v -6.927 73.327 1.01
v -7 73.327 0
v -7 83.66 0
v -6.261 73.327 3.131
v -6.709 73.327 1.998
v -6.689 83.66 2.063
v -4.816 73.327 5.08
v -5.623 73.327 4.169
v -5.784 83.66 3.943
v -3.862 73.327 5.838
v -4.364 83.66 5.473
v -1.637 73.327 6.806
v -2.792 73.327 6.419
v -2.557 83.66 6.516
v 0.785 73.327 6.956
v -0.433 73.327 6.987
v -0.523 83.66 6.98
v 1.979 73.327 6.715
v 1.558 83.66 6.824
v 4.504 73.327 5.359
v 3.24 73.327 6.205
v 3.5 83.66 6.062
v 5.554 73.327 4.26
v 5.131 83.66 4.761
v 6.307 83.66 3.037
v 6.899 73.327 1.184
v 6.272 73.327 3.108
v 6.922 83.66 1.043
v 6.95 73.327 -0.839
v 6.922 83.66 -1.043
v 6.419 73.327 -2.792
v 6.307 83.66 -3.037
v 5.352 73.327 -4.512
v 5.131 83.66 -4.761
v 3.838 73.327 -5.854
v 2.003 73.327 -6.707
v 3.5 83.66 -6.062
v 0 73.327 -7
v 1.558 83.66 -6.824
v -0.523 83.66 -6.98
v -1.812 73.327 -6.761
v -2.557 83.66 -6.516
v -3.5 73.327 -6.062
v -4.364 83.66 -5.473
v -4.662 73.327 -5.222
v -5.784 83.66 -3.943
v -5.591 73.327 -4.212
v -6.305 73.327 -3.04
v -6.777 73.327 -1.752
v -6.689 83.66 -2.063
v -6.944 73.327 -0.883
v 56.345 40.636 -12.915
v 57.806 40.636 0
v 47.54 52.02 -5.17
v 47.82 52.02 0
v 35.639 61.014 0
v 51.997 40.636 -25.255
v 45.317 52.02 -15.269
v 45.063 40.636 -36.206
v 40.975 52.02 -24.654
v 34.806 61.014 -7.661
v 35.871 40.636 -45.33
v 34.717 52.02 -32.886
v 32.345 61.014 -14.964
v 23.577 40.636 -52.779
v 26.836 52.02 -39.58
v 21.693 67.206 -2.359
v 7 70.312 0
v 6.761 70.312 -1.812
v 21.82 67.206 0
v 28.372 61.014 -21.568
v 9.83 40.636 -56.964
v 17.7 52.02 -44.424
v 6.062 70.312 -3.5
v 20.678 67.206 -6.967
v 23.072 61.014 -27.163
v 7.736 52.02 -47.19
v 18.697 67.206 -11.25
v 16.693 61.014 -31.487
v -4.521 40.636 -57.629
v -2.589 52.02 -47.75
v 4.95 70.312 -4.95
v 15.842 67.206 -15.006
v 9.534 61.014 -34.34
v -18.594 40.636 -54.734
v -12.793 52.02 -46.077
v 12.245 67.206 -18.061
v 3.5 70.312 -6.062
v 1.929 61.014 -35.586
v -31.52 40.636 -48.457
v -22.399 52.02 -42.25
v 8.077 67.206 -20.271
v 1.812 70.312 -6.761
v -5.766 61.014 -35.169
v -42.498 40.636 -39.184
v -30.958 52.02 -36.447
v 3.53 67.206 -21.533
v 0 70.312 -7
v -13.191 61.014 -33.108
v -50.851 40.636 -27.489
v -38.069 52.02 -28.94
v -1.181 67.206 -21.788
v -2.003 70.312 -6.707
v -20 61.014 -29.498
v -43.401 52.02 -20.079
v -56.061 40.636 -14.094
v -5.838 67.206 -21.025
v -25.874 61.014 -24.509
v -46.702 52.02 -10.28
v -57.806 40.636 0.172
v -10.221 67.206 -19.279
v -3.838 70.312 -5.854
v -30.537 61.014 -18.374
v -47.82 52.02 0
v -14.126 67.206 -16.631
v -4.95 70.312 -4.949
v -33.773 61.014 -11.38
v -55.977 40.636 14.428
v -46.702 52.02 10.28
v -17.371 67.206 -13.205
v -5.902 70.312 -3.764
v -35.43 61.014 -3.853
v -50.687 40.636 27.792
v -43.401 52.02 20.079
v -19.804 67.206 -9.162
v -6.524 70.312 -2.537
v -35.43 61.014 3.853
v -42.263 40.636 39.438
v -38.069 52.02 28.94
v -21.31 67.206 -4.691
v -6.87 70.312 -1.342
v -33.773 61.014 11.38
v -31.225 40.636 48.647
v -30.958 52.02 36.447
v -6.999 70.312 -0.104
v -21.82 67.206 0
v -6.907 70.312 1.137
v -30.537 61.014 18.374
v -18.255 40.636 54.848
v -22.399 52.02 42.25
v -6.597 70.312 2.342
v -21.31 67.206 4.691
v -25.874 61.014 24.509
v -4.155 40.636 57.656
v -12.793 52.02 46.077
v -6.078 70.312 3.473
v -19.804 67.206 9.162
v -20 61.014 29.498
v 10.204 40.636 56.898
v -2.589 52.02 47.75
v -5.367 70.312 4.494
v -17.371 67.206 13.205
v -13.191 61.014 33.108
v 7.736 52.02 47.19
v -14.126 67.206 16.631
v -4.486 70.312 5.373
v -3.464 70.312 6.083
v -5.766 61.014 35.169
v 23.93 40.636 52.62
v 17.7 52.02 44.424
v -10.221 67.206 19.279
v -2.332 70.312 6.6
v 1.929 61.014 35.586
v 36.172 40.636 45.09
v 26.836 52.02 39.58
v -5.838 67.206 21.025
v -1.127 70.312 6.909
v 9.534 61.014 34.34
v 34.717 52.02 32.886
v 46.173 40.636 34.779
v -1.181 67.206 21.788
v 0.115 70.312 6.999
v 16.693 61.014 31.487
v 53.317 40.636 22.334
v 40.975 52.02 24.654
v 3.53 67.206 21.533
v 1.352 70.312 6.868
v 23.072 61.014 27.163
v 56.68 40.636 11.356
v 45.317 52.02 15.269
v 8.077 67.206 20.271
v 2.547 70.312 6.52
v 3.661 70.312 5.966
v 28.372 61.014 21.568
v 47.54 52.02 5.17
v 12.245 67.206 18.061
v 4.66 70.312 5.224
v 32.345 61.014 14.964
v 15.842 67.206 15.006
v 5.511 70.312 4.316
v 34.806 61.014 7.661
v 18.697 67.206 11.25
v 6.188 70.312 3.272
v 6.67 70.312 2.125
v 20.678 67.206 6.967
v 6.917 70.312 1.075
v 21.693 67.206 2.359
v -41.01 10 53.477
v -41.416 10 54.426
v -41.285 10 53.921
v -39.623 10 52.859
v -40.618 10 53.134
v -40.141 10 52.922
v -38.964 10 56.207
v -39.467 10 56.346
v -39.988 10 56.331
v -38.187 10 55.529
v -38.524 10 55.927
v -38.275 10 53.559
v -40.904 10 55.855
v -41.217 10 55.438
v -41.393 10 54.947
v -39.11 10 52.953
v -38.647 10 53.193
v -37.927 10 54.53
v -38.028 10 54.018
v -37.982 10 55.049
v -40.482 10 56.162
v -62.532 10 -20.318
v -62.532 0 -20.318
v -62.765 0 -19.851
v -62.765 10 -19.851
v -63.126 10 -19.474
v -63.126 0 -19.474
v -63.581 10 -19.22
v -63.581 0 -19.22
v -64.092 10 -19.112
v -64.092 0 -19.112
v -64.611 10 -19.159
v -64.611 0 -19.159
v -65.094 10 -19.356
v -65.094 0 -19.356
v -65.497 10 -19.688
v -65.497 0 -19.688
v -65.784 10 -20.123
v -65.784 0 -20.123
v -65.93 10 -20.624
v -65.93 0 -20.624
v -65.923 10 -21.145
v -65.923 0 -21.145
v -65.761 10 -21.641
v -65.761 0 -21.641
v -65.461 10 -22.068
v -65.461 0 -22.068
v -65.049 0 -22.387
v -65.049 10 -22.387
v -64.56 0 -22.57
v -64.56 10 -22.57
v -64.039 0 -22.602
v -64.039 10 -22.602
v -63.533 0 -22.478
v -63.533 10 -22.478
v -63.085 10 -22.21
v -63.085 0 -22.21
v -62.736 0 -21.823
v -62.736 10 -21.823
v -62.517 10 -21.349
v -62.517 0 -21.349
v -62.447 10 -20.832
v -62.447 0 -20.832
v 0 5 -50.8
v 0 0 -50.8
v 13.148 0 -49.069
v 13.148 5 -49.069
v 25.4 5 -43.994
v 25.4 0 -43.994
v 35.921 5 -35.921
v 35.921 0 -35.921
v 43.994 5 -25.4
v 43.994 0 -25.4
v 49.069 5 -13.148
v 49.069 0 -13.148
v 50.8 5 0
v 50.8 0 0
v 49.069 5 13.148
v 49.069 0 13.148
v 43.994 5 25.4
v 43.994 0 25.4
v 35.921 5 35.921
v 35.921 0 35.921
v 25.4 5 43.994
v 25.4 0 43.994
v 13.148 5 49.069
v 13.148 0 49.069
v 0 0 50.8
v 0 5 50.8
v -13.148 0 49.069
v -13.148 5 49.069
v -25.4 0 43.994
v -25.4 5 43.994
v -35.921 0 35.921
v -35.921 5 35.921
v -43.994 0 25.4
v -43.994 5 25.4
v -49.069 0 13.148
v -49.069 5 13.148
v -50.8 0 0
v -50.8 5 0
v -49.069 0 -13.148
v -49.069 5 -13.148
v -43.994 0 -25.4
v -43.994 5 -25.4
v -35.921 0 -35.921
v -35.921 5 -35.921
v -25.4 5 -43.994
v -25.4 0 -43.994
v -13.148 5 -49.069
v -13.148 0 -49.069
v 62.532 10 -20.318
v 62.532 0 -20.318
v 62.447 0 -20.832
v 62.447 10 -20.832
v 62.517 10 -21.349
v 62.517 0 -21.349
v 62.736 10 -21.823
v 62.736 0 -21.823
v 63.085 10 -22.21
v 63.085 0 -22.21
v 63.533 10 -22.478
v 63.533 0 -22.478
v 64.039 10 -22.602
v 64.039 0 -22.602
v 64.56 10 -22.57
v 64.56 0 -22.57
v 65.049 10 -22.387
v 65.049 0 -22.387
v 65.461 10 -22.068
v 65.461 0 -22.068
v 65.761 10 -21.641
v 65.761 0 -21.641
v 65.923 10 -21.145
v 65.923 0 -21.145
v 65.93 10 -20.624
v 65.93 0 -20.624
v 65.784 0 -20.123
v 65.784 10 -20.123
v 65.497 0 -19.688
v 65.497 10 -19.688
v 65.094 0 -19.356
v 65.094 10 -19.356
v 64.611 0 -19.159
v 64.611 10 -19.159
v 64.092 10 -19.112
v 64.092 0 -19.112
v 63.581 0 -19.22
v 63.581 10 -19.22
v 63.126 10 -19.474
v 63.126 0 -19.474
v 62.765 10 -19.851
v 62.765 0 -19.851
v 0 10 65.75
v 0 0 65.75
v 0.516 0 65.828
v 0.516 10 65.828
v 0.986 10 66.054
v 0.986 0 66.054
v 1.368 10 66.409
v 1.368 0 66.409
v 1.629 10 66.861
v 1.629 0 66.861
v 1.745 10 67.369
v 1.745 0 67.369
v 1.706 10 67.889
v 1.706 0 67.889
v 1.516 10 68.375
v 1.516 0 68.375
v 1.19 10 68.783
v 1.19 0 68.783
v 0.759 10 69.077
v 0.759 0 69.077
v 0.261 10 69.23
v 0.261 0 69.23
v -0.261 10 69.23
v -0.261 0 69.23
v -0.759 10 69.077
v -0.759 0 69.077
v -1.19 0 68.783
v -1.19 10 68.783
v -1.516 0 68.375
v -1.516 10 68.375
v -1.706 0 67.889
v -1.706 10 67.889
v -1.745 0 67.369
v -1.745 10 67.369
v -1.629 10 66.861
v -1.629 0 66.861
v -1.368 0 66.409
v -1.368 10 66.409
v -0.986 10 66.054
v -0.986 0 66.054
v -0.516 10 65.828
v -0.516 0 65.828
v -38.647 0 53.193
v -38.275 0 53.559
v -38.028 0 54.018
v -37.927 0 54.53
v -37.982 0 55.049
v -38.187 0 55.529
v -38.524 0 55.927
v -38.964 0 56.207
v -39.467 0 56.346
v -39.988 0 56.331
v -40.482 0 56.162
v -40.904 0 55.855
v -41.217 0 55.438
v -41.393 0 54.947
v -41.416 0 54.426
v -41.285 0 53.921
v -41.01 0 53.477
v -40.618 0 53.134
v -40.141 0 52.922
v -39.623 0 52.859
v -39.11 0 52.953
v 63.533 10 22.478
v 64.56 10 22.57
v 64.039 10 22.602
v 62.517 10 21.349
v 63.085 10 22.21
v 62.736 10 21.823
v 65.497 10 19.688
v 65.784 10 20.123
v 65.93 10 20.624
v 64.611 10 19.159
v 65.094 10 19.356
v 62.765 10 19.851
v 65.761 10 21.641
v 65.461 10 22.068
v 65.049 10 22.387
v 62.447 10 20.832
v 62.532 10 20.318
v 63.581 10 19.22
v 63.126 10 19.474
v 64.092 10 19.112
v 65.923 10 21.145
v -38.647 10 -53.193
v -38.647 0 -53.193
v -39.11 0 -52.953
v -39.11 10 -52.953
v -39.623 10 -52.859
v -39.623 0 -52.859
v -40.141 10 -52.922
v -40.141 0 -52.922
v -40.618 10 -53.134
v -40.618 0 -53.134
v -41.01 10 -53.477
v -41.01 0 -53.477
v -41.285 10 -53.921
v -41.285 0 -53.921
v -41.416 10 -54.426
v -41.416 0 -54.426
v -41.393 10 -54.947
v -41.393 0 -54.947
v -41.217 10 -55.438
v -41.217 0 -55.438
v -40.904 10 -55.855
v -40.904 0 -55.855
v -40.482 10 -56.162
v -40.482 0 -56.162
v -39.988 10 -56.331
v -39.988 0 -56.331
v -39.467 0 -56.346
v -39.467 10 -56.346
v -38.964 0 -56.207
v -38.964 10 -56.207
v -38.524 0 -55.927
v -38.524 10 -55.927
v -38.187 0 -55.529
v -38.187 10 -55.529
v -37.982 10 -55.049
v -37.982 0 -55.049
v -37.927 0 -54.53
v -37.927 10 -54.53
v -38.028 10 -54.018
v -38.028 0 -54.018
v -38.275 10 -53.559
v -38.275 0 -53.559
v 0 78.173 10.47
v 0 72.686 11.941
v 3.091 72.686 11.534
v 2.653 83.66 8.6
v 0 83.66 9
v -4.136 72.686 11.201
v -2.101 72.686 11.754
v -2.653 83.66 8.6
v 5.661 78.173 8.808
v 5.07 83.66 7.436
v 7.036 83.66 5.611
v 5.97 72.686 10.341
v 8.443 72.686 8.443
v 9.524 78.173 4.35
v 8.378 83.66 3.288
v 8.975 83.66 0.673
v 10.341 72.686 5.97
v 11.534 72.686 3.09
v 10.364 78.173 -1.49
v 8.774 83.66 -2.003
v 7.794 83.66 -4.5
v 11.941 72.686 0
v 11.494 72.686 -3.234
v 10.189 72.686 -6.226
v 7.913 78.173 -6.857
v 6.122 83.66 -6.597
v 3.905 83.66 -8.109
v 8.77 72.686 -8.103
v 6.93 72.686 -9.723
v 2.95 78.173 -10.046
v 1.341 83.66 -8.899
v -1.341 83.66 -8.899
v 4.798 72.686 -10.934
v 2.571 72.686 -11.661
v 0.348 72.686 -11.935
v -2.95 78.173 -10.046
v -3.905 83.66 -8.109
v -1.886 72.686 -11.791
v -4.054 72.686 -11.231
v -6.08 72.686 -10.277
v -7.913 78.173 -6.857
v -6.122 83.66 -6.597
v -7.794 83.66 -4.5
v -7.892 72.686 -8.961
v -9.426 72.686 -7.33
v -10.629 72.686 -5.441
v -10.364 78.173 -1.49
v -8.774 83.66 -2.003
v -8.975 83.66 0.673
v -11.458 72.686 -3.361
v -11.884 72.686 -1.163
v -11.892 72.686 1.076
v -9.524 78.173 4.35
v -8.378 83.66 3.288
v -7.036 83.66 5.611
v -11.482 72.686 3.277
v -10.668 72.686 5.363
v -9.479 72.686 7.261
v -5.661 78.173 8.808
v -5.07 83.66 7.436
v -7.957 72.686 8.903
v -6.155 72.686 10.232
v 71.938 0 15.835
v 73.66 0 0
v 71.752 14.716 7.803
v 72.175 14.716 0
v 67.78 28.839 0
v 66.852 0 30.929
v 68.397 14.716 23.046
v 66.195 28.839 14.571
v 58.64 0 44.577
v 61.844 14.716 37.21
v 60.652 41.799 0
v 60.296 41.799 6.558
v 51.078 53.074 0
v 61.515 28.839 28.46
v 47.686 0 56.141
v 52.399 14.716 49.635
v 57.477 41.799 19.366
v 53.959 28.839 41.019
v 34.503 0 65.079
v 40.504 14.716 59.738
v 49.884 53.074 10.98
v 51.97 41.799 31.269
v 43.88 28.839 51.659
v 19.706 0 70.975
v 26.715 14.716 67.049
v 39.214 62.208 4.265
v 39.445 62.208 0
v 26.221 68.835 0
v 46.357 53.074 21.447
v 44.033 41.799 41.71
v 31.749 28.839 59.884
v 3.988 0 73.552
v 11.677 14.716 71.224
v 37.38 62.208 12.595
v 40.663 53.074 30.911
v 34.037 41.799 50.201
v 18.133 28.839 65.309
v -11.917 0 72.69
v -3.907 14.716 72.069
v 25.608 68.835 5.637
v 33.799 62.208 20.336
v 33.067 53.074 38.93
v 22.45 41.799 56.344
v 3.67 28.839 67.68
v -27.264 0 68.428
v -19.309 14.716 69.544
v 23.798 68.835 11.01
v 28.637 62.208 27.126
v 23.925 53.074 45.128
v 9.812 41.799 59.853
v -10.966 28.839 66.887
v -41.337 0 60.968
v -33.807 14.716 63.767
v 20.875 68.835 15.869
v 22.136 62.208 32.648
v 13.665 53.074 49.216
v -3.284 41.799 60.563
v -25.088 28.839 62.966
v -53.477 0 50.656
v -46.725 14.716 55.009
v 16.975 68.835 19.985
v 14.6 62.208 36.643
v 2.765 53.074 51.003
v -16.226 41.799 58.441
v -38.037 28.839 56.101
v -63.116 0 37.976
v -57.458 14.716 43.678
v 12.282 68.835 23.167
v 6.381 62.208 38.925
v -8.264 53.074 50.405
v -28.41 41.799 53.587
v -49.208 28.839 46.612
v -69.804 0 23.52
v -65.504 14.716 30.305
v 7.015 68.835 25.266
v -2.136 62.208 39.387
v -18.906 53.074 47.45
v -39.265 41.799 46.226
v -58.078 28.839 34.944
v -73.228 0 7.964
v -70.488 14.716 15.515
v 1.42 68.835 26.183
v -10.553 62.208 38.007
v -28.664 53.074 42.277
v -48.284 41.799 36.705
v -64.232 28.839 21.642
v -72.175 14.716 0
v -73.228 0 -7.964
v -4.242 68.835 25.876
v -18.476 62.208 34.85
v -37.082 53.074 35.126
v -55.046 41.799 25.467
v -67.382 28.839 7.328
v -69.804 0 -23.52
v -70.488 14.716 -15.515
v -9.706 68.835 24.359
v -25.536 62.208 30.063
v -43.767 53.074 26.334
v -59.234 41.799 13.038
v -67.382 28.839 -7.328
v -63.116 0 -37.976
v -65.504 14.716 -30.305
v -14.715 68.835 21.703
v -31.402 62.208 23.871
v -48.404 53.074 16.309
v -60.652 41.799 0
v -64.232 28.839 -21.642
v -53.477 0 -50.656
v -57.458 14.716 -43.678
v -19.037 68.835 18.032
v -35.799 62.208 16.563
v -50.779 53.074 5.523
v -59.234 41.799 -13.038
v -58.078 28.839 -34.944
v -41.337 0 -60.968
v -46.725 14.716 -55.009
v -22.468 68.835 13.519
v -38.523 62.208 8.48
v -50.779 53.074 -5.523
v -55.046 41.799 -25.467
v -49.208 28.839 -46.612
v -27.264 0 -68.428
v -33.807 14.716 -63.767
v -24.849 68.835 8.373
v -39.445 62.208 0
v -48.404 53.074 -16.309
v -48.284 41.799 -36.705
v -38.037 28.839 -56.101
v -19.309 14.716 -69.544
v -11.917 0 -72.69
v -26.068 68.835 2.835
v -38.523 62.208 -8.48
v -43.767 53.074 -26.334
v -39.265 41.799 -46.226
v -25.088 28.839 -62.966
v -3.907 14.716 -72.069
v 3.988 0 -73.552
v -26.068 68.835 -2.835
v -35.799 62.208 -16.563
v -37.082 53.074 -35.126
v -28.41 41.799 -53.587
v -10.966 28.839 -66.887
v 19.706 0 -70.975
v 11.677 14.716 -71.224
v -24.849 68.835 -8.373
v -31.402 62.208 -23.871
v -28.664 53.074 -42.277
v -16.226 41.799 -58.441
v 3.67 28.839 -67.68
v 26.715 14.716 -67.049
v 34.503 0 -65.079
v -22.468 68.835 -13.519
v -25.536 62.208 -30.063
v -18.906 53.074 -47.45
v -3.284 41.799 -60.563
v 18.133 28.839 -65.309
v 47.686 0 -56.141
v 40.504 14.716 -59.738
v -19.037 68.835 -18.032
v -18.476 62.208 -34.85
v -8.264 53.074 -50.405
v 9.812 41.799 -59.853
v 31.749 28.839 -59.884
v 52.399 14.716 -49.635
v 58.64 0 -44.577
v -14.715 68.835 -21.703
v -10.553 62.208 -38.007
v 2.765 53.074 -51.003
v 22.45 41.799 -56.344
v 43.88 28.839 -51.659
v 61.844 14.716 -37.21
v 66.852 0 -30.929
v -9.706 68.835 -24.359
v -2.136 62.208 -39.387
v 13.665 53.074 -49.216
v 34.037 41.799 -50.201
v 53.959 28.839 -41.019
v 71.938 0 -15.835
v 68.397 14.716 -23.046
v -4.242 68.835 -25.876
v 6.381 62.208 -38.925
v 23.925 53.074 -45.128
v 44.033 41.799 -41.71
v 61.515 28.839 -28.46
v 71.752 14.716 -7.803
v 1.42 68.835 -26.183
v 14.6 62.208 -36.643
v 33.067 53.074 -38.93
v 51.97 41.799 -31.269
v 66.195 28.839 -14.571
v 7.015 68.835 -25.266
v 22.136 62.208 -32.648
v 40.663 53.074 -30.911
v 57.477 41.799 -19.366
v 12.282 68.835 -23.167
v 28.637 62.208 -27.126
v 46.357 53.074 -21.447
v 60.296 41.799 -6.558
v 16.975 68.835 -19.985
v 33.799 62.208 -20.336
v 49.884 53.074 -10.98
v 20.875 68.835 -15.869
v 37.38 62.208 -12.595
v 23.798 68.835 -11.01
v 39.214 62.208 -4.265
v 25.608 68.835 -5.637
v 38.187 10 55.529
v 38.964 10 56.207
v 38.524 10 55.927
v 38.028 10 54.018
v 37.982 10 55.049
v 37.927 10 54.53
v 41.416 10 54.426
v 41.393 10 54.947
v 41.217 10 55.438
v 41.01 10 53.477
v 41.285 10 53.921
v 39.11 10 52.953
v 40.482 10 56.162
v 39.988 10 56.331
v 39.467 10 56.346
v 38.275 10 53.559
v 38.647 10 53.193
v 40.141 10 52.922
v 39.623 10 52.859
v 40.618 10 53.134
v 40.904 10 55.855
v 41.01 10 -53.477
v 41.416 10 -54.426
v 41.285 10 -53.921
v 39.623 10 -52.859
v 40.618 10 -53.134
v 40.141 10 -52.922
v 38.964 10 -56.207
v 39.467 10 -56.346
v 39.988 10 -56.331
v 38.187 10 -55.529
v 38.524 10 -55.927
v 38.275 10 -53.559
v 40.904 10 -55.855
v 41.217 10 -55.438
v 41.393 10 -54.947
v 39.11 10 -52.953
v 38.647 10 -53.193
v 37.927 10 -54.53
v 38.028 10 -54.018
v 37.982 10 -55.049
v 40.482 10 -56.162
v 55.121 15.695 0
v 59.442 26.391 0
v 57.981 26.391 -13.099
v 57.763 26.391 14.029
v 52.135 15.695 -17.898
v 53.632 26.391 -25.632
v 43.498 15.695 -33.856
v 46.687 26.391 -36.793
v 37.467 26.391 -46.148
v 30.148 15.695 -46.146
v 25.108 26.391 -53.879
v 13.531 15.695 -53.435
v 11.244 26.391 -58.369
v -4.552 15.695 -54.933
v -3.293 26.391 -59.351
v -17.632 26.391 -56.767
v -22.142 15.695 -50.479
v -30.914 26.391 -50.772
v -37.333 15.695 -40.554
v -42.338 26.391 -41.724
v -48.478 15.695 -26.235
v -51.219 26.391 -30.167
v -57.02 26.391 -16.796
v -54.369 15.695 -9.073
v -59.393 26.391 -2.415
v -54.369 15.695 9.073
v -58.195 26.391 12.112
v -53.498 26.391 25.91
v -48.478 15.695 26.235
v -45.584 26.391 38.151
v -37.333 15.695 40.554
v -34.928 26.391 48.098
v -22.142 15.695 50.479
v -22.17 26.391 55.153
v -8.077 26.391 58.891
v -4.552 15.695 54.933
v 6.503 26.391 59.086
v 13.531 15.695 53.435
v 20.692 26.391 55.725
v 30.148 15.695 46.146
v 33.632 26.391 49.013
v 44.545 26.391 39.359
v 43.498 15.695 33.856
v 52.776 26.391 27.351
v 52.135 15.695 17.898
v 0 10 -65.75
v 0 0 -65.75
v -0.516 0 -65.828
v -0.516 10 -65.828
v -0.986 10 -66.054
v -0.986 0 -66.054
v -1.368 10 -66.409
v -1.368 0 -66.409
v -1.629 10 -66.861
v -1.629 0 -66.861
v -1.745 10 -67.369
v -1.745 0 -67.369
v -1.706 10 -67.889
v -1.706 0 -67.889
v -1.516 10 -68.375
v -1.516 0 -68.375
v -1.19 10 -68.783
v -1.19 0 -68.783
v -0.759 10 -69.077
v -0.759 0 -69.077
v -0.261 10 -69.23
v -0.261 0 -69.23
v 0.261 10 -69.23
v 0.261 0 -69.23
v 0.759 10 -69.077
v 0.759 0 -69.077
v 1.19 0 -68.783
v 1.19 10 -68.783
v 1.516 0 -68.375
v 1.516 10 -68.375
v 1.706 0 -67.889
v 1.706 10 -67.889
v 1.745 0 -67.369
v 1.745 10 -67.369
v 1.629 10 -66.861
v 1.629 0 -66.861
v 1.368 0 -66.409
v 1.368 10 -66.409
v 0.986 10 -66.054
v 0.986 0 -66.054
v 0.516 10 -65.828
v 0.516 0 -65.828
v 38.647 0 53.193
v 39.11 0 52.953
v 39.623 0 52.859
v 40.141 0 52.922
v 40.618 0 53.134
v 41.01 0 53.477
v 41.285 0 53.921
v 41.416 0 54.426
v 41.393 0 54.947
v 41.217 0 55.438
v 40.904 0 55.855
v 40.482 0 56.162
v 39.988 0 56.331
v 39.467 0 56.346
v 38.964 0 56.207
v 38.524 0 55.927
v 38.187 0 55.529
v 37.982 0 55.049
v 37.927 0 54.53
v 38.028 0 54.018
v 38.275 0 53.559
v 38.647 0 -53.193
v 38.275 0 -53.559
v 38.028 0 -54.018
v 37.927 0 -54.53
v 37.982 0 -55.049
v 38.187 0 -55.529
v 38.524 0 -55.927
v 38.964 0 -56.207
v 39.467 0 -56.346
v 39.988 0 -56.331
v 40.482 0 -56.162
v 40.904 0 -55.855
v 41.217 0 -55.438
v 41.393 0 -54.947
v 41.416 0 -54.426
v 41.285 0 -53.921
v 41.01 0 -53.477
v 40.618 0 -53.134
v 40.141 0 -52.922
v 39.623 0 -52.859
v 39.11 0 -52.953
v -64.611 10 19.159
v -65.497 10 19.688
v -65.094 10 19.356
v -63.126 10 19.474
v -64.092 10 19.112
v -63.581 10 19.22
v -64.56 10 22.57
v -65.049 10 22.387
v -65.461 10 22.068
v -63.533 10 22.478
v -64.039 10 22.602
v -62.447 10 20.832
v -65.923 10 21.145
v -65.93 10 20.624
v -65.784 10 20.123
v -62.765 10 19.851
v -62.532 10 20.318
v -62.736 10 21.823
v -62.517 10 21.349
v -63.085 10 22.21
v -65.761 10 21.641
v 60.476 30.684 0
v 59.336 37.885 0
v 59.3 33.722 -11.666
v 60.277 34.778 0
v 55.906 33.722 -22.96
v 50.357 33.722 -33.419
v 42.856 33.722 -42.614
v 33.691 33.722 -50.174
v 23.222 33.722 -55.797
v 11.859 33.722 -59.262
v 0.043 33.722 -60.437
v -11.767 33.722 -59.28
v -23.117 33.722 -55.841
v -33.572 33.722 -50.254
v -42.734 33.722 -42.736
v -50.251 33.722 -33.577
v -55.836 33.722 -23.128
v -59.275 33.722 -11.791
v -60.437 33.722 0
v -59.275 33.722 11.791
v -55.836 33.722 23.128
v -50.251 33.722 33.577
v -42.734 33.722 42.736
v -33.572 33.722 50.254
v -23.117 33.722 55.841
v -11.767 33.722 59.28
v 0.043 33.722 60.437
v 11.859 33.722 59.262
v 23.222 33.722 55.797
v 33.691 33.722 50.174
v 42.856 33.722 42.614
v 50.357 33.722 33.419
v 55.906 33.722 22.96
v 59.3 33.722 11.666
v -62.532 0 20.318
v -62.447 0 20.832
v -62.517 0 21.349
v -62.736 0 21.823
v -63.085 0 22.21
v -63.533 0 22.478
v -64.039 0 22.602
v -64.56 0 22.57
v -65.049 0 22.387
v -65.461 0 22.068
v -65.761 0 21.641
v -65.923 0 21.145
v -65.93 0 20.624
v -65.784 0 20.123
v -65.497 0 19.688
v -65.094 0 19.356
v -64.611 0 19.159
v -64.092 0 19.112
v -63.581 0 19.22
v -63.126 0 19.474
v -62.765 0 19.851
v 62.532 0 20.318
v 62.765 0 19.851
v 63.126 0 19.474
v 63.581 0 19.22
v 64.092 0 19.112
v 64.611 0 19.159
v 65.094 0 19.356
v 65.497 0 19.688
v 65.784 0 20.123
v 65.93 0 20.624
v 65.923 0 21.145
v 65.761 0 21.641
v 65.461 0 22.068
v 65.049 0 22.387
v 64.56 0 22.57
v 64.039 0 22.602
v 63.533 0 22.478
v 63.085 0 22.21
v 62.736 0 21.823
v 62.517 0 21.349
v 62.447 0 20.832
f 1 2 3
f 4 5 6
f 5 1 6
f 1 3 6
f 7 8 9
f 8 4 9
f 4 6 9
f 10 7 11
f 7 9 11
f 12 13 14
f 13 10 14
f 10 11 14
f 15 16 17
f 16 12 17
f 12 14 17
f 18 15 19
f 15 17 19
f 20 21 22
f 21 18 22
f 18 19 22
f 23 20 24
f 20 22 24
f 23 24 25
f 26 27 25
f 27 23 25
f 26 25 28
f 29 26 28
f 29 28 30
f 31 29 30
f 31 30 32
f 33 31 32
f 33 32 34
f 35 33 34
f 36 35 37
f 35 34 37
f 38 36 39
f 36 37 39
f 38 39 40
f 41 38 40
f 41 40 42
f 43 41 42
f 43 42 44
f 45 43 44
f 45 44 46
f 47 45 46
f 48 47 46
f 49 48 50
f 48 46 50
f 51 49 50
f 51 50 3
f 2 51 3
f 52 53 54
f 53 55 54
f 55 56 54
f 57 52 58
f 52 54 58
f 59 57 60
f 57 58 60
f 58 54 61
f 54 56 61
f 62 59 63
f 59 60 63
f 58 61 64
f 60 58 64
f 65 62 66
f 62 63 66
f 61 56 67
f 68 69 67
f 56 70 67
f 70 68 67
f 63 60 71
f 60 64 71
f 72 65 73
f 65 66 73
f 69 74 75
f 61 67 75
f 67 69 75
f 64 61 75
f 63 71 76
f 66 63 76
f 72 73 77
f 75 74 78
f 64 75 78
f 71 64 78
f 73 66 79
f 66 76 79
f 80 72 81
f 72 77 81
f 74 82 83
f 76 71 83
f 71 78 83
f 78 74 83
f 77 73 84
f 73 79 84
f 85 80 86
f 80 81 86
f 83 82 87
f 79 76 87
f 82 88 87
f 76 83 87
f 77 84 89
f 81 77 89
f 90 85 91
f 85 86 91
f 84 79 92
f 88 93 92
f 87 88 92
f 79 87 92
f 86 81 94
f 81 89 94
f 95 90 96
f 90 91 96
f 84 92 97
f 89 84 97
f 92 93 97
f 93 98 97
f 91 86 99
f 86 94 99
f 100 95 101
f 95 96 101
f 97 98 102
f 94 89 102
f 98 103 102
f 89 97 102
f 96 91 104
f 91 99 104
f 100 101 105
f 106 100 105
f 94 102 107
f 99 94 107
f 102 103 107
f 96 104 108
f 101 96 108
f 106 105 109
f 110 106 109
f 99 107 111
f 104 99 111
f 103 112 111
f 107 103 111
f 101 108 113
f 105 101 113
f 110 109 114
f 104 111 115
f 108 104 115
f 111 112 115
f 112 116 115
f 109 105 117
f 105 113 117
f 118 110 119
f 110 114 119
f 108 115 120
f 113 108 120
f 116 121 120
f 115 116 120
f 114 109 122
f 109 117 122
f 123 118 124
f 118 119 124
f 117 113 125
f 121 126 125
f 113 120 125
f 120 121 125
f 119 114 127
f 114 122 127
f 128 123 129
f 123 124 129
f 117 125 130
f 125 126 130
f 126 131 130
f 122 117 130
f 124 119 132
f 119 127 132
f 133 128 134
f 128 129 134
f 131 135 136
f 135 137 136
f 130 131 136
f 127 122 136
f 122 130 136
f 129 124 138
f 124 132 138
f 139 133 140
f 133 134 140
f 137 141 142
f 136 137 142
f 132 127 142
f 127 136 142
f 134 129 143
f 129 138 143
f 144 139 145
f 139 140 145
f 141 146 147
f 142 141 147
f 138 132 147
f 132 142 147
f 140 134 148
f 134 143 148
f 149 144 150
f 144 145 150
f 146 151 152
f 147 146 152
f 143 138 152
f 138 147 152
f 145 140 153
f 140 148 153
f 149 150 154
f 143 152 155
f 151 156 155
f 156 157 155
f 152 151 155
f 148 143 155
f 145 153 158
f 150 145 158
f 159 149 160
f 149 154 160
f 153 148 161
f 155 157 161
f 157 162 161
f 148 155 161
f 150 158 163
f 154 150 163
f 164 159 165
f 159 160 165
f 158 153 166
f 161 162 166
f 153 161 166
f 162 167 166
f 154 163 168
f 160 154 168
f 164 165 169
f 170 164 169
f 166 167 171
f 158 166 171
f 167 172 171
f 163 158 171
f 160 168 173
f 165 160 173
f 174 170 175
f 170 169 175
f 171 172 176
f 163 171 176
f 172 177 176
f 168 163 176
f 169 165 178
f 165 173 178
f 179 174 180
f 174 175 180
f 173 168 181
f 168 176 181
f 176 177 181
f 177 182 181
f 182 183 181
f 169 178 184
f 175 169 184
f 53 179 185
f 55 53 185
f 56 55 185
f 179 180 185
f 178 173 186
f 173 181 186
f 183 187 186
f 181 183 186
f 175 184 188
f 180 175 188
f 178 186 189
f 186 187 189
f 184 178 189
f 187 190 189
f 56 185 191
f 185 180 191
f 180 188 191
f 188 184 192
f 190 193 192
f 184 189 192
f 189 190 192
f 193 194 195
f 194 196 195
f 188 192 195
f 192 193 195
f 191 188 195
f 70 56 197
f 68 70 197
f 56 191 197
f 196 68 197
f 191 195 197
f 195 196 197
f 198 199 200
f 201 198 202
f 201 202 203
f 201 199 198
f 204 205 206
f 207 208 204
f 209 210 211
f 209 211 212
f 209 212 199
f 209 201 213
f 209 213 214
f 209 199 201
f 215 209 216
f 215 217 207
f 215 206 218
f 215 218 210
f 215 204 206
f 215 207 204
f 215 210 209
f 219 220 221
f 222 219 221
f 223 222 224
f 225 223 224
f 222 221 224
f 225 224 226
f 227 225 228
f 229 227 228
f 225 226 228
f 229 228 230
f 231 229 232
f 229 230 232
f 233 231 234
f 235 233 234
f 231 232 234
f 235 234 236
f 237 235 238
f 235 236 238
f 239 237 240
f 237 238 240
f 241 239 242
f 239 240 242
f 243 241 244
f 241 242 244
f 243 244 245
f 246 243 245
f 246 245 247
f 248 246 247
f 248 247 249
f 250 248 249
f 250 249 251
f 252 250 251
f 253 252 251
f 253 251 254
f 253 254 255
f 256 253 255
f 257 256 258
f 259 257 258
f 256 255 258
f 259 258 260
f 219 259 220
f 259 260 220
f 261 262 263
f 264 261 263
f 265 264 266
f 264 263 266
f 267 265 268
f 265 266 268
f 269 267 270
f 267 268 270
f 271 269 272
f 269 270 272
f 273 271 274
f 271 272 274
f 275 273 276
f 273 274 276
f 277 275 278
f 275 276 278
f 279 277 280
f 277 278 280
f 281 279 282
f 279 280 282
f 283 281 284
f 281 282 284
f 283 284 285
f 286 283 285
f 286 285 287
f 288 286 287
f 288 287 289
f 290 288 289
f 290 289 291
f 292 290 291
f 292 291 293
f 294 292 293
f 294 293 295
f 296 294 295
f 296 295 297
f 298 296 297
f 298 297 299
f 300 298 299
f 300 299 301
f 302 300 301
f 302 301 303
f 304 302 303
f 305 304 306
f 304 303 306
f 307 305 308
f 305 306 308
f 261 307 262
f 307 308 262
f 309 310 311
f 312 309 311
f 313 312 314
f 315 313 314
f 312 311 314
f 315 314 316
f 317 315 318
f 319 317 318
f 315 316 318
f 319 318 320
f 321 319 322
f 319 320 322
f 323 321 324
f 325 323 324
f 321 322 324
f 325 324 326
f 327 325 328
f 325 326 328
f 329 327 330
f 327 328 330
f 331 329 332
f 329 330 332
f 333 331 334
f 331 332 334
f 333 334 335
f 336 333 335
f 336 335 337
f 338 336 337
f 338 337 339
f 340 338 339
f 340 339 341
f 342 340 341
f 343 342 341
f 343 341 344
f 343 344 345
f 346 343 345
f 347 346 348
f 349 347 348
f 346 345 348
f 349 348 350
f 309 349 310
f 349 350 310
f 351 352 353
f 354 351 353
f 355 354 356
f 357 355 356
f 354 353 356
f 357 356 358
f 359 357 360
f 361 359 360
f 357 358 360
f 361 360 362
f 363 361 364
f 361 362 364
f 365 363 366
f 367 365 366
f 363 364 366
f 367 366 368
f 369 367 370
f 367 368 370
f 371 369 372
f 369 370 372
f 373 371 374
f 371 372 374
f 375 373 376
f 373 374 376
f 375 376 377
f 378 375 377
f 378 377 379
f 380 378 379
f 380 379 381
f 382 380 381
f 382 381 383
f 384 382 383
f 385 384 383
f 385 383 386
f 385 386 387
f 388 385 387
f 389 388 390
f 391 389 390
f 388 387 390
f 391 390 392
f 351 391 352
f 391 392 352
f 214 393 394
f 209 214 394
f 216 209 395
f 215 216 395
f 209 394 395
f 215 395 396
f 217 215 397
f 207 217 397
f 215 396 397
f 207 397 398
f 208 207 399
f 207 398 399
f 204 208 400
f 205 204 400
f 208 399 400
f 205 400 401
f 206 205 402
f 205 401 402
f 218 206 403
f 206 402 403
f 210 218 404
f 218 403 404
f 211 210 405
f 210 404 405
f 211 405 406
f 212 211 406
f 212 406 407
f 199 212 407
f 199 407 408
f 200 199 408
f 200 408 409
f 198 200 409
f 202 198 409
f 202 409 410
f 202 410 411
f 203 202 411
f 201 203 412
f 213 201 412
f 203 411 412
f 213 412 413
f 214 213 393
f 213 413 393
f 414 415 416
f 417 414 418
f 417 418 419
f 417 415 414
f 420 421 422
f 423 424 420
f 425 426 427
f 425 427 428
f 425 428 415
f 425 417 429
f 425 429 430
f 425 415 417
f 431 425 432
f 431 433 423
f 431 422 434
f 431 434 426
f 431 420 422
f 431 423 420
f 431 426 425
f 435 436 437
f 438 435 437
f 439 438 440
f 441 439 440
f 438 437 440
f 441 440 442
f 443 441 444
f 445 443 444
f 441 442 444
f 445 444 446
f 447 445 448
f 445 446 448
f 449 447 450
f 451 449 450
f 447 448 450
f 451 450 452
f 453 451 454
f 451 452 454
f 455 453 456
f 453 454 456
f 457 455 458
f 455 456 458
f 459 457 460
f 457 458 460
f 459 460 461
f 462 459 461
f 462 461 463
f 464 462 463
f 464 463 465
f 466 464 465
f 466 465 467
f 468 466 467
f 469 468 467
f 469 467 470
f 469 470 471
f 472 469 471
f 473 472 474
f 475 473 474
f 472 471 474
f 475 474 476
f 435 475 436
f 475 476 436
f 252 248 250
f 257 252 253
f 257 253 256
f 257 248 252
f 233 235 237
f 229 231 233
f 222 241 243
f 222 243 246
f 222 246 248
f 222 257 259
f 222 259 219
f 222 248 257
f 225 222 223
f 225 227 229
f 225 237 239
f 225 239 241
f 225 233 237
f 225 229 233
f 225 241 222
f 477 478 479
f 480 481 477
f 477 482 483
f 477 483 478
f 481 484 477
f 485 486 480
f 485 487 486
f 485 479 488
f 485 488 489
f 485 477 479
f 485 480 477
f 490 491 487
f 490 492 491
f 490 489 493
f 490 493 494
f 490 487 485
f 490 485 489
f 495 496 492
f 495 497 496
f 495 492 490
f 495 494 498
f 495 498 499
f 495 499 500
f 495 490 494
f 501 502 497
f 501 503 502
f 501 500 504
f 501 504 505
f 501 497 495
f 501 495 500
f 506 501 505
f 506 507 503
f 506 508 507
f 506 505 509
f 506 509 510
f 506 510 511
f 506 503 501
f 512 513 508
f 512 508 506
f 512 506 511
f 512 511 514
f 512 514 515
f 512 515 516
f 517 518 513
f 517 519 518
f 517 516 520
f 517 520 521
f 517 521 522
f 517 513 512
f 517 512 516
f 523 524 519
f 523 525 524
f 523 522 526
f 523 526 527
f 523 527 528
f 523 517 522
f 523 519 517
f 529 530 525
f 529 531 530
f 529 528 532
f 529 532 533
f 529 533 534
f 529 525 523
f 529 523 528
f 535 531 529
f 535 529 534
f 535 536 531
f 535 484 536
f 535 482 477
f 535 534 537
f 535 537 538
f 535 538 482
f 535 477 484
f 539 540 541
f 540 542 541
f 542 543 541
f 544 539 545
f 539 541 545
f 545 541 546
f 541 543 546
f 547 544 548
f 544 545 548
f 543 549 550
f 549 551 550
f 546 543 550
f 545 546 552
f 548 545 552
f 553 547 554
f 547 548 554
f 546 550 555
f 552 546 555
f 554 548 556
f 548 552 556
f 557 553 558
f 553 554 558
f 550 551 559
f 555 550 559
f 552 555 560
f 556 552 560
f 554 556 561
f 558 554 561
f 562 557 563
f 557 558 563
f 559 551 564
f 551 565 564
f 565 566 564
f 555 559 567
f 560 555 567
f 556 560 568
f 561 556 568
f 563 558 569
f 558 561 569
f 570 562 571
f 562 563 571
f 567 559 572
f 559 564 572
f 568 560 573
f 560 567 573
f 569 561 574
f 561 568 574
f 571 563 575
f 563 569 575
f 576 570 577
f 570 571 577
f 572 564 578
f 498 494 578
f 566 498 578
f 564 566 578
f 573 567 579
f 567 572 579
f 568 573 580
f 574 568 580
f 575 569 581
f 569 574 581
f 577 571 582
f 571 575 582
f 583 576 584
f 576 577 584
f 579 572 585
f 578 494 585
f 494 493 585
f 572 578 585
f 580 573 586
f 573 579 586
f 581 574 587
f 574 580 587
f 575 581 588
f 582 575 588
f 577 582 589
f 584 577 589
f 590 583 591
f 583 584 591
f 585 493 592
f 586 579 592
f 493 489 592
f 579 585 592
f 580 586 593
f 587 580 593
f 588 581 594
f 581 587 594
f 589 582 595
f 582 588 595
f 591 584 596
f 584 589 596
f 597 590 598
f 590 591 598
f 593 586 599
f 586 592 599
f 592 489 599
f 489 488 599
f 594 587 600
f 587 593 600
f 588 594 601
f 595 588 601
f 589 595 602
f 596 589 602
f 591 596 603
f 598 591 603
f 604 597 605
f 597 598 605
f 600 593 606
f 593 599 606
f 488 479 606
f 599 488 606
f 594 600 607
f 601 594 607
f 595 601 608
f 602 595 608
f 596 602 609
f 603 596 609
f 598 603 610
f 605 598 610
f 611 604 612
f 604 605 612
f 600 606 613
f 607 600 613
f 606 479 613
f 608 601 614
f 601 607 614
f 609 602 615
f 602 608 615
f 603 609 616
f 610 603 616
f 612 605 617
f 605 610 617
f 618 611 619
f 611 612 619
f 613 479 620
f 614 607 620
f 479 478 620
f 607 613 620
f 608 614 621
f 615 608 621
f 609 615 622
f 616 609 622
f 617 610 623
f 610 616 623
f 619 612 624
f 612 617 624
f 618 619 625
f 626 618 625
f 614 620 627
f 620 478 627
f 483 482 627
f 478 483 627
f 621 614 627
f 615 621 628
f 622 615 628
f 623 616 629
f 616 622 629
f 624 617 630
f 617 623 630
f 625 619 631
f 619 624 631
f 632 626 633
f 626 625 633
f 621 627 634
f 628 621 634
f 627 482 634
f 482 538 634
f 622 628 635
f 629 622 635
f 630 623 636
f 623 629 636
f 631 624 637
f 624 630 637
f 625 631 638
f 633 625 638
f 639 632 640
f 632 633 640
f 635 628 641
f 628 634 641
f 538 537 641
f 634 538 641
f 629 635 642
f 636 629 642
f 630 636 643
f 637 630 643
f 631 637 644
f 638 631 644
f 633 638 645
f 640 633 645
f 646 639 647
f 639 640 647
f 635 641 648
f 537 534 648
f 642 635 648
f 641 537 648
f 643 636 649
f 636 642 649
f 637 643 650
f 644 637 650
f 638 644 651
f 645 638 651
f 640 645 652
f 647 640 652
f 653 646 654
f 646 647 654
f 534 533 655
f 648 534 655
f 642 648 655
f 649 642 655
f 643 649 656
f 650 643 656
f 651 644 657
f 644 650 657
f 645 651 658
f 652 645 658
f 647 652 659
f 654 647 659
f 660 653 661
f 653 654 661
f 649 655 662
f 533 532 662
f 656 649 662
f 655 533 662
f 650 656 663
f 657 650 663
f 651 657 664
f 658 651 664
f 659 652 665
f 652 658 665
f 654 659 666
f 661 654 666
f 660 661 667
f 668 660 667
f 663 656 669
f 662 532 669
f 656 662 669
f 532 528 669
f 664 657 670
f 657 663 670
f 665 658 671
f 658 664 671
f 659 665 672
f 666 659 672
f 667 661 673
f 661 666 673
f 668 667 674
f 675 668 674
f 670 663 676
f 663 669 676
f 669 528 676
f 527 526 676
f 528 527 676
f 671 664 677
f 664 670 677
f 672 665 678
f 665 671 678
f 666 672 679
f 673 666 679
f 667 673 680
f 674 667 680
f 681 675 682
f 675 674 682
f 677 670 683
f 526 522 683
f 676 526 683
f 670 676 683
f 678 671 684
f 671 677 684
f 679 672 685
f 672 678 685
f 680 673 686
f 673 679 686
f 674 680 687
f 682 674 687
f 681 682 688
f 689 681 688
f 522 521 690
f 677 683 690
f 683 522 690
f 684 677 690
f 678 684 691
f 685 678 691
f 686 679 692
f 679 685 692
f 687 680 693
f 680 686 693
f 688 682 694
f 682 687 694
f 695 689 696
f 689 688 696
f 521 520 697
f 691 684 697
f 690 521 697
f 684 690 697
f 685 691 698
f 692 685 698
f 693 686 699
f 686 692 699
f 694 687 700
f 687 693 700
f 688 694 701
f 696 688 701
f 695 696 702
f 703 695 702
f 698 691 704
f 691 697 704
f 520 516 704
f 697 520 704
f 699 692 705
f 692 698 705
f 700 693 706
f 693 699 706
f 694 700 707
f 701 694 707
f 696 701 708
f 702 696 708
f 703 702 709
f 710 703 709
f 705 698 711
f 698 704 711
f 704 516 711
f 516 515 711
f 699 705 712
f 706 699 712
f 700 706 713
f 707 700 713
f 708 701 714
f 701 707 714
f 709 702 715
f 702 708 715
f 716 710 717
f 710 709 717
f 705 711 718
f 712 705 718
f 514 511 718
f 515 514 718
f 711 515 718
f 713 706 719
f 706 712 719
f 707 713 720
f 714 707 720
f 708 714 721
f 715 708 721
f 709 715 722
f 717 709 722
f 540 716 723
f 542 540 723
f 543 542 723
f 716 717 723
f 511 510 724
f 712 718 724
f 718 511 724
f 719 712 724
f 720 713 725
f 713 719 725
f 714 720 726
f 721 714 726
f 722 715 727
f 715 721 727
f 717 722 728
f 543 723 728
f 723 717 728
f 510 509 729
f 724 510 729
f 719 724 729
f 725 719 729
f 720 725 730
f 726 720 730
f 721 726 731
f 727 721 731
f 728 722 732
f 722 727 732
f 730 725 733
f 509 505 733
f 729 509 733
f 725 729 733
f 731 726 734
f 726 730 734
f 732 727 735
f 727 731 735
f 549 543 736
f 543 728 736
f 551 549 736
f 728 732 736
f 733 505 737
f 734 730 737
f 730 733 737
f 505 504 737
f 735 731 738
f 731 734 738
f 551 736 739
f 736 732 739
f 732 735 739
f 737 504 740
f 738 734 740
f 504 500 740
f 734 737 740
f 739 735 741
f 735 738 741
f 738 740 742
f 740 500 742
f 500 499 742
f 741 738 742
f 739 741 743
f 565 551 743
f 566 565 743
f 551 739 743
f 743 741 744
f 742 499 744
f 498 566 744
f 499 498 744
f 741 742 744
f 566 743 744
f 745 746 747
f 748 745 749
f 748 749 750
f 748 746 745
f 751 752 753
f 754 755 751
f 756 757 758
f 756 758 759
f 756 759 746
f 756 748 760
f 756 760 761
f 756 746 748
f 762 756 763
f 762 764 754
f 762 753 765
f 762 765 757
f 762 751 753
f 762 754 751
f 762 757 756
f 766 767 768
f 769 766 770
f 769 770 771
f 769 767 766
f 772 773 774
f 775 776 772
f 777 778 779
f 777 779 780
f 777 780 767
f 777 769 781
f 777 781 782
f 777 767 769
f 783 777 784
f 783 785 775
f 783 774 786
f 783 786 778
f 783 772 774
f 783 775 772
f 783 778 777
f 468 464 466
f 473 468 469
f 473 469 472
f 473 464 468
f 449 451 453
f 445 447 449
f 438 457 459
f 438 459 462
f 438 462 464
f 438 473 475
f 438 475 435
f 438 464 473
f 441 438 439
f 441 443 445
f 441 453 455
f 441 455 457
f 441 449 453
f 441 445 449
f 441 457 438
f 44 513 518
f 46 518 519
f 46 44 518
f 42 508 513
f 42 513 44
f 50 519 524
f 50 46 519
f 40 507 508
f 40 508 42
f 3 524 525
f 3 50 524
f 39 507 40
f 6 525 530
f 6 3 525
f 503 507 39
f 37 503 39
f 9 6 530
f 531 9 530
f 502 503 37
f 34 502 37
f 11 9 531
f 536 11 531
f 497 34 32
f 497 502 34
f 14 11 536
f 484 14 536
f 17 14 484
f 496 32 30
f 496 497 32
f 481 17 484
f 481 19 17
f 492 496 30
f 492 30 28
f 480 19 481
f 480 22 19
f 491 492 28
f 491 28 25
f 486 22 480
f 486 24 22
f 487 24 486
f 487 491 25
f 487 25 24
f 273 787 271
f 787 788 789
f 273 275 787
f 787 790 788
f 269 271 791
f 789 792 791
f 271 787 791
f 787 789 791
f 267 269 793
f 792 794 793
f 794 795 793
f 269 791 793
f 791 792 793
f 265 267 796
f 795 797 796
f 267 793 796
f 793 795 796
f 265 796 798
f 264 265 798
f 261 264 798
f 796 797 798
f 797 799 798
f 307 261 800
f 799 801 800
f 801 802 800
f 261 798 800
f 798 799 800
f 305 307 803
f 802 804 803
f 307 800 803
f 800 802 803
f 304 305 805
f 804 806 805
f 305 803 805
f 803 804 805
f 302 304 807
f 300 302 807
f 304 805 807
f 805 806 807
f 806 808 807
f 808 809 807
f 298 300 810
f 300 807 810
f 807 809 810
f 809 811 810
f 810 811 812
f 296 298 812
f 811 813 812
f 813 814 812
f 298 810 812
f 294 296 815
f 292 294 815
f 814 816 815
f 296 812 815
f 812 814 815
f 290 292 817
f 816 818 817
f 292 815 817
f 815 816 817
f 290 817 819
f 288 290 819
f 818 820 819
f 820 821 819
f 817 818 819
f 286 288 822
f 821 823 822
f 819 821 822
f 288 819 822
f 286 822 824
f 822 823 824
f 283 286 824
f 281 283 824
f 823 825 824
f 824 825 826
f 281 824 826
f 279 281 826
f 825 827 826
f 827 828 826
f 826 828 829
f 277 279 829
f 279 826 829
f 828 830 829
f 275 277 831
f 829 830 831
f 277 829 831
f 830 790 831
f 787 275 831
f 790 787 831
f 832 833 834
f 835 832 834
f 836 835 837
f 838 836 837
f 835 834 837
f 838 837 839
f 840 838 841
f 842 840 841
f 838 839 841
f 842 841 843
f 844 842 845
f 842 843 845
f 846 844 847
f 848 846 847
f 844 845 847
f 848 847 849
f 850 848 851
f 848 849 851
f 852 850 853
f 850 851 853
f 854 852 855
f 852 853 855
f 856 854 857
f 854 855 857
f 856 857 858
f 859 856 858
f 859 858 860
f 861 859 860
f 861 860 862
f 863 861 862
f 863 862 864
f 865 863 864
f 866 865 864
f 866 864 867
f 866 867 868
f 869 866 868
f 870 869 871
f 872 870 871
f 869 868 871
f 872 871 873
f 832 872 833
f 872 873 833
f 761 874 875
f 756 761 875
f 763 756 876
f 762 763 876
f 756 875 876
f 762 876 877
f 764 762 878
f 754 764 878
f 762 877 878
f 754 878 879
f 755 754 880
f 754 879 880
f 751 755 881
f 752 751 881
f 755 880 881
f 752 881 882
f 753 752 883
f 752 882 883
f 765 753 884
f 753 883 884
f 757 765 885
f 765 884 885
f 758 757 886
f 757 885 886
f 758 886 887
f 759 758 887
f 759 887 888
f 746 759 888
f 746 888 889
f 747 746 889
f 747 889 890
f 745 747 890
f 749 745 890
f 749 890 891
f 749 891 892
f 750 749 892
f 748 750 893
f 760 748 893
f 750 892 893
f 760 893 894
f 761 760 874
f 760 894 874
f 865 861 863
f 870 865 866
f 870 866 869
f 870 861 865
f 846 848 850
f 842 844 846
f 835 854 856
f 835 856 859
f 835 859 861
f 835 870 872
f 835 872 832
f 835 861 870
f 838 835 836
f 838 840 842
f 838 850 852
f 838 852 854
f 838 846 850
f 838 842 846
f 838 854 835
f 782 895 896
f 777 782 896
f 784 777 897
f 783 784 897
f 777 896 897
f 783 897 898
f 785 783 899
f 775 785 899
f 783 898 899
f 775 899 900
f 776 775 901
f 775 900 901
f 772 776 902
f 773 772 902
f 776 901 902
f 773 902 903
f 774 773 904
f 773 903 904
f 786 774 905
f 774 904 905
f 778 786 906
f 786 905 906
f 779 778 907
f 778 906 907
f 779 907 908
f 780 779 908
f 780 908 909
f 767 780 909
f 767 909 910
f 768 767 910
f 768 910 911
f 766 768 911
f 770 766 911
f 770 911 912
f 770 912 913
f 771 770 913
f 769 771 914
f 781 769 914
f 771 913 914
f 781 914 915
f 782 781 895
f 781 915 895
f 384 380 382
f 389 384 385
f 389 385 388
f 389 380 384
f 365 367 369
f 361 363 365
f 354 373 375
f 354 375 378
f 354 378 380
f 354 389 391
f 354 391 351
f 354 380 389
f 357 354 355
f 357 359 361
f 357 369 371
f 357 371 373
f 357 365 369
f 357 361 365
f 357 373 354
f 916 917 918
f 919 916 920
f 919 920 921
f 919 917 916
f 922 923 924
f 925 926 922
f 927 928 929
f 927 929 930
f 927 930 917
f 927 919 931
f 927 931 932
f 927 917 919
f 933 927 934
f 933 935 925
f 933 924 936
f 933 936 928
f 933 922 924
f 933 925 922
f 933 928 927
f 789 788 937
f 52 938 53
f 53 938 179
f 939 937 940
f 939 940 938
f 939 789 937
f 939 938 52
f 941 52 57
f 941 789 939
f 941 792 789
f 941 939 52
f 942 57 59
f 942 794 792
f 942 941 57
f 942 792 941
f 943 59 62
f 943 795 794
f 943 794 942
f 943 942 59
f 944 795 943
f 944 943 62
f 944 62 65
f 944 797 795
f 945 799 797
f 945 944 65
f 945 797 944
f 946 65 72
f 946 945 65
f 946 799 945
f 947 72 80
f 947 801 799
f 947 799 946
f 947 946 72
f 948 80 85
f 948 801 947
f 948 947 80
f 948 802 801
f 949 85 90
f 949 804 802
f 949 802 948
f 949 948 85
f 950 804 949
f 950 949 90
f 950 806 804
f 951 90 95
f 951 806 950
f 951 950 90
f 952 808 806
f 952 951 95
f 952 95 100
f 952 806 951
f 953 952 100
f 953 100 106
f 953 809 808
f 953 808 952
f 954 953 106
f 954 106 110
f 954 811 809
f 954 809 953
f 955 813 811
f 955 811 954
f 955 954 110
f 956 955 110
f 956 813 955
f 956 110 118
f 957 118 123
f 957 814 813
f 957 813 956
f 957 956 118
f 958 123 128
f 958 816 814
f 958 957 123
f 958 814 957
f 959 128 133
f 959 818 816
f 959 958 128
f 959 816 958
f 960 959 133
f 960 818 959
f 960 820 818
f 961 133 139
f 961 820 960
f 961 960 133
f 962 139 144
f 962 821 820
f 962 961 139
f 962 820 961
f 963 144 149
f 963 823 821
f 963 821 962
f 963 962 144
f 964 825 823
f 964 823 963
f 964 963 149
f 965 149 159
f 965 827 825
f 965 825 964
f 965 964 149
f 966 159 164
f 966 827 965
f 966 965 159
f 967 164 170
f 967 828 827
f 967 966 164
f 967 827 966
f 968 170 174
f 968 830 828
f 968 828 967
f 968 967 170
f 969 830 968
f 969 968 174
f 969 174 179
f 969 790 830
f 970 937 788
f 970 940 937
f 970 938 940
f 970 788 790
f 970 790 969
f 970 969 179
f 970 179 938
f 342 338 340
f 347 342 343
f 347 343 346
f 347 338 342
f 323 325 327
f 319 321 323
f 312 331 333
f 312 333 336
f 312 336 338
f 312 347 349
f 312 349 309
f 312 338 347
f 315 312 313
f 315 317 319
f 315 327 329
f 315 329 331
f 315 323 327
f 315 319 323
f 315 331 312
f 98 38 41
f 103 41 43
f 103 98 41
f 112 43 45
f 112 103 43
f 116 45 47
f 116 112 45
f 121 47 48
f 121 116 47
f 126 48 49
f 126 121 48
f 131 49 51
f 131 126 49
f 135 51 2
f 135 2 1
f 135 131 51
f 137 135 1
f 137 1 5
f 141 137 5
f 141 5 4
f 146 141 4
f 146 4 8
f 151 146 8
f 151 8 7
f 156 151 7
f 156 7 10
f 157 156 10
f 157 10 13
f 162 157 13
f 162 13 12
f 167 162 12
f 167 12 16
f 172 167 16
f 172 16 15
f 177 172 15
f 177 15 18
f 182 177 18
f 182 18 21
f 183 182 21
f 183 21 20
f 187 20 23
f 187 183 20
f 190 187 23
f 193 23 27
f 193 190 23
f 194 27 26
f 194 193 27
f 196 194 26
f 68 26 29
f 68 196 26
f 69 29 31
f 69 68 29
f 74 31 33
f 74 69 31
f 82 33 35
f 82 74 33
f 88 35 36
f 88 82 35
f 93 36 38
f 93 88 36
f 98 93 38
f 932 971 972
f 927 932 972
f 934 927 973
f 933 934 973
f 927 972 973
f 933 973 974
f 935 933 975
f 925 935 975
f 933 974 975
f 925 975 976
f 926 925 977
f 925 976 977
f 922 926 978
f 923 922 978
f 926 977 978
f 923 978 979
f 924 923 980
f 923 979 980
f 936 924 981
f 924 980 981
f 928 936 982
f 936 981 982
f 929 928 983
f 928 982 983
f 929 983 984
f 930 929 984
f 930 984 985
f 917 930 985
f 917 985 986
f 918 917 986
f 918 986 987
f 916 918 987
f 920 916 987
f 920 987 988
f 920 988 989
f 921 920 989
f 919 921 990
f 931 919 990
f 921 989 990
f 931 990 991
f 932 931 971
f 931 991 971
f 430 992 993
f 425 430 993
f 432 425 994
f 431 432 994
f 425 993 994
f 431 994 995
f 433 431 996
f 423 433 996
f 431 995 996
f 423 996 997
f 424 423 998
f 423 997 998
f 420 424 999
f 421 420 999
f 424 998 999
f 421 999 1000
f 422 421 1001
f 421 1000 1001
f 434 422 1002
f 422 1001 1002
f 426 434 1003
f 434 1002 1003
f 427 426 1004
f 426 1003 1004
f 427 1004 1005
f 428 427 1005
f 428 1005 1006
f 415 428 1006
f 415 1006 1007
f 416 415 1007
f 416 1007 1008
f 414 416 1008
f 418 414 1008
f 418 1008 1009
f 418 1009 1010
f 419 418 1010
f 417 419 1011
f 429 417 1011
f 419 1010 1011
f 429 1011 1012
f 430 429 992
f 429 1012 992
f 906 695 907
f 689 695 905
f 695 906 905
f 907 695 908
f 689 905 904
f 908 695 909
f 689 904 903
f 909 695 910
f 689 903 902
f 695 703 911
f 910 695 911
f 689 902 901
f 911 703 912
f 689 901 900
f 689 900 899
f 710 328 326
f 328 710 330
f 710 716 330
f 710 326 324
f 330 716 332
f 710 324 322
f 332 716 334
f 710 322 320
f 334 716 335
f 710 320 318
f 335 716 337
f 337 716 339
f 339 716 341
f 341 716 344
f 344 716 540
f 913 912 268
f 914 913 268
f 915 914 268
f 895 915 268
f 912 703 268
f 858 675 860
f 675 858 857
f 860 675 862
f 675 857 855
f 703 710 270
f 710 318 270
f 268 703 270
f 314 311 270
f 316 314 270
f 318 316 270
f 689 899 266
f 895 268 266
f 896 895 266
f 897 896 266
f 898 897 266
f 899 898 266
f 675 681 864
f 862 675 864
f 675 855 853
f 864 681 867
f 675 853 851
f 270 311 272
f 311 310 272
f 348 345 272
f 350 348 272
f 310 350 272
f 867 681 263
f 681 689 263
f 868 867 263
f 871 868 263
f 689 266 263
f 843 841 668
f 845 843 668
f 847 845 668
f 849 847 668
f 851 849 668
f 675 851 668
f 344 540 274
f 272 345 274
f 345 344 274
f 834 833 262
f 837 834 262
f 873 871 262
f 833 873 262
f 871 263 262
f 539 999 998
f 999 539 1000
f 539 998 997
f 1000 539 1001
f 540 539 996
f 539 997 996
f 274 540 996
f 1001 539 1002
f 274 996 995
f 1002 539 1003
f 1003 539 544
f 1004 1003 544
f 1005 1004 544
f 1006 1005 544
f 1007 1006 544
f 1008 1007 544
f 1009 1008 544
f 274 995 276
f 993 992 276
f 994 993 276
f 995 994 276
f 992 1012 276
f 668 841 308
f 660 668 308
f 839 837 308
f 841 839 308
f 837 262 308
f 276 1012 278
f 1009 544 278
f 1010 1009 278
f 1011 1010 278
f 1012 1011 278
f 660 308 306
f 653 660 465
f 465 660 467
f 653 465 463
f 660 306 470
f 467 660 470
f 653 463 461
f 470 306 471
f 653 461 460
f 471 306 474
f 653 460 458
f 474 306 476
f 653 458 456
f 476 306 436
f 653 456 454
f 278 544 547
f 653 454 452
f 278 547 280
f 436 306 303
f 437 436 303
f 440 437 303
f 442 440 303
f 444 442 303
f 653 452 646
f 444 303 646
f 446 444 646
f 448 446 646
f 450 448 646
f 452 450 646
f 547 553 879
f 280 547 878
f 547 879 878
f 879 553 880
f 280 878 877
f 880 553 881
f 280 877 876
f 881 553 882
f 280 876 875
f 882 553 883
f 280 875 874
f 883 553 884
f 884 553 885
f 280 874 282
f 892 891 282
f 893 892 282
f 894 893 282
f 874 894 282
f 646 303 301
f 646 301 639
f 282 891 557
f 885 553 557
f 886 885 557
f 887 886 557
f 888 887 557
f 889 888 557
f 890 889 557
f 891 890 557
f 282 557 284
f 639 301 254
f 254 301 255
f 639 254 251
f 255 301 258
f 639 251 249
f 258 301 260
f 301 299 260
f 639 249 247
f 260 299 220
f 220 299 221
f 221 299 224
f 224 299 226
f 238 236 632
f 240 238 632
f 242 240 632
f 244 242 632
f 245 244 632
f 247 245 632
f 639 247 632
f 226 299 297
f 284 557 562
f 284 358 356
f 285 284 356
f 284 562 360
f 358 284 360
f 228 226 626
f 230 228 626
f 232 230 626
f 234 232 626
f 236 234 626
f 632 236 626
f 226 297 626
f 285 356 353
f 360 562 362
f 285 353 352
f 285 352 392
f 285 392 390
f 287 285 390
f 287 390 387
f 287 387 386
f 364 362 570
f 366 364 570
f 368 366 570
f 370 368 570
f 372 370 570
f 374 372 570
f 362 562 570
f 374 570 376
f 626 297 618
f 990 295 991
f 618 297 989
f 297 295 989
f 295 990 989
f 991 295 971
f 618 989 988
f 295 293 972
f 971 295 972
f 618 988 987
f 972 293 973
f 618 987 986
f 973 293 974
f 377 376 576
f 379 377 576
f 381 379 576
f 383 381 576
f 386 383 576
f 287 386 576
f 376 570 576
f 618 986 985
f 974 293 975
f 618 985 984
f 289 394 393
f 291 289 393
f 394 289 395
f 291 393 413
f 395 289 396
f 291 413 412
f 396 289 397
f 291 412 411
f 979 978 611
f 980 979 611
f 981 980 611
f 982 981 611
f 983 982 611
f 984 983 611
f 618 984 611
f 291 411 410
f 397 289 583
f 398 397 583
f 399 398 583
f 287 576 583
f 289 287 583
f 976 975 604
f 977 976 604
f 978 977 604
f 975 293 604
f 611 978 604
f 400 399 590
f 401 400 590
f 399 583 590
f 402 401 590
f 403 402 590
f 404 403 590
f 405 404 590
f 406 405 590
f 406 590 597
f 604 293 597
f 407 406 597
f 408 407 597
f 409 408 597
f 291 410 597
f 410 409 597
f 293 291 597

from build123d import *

# Parameters (mm, degrees)
SKETCH3_R                = 50.8
CUT_EXTRUDE1_DEPTH       = 35
FILLET1_R                = 15
SKETCH5_R                = 7
GSM_ANTENNA_DEPTH        = 133.362935901
SKETCH9_R                = 1.75
CUT_EXTRUDE6_DEPTH       = 10
CIRPATTERN1_COUNT        = 10
BOSS_EXTRUDE2_REACH      = 135.606
BOSS_EXTRUDE2_END_RADIUS = 73.66
SKETCH13_R               = 9
SKETCH13_R_2             = 7
DRAFT2_ANGLE             = 15


with BuildPart() as part:
    # Sketch2 → Dome (revolve)
    with BuildSketch(Plane.XY):
        with BuildLine():
            Line((0, 73.66), (0, 0))
            Line((0, 0), (73.66, 0))
            ThreePointArc((73.66, 0), (52.085485502, 52.085485502), (0, 73.66))
        make_face()
    revolve(axis=Axis((0, 73.66, 0), (0, -1, 0)))

    # Sketch3 → Cut-Extrude1 (cut)
    with BuildSketch(Plane.XZ):
        Circle(SKETCH3_R)
    extrude(amount=-CUT_EXTRUDE1_DEPTH, mode=Mode.SUBTRACT)

    # Sketch4 → Wall Shape (revolve, cut)
    with BuildSketch(Plane.XY):
        with BuildLine():
            Line((-50.8, 5), (-50.8, 0))
            Line((-50.8, 0), (0, 0))
            Line((0, 0), (0, 70.66))
            ThreePointArc((0, 70.66), (-36.285571477, 60.631616361), (-62.271521348, 33.393011678))
            Line((-62.271521348, 33.393011678), (-50.8, 5))
        make_face()
    revolve(axis=Axis((0, 0, 0), (0, 1, 0)), mode=Mode.SUBTRACT)

    # Fillet1
    fillet1_edges = [part.edges().sort_by_distance(p)[0] for p in [
        (62.271521348, 33.393011678, 0),
    ]]
    fillet(fillet1_edges, radius=FILLET1_R)

    # Sketch5 → GSM Antenna (cut, through all)
    with BuildSketch(Plane(origin=(0, -8.000000002, 0), x_dir=(1, 0, 0), z_dir=(0, 1, 0))):
        Circle(SKETCH5_R)
    extrude(amount=GSM_ANTENNA_DEPTH, mode=Mode.SUBTRACT)

    # Sketch9 → Cut-Extrude6 (cut)
    with BuildSketch(Plane(origin=(0, 0, 0), x_dir=(-1, 0, 0), z_dir=(0, -1, 0))):
        with Locations((0, -67.5)):
            Circle(SKETCH9_R)
    cut_extrude6 = extrude(amount=-CUT_EXTRUDE6_DEPTH, mode=Mode.SUBTRACT)

    # CirPattern1: Cut-Extrude6 ×10 about axis
    cirpattern1_axis = Axis((0, 35, 0), (0, -1, 0))
    for i in range(1, CIRPATTERN1_COUNT):
        add(cut_extrude6.rotate(cirpattern1_axis, i * 360 / CIRPATTERN1_COUNT), mode=Mode.SUBTRACT)

    # Boss-Extrude2: up to this sphere (the profile starts outside it)
    boss_extrude2_end = Location((0, 0, 0)) * Sphere(BOSS_EXTRUDE2_END_RADIUS, mode=Mode.PRIVATE)
    # Sketch13 → Boss-Extrude2 (add, up to the surface)
    with BuildSketch(Plane(origin=(0, 83.66, 0), x_dir=(1, 0, 0), z_dir=(0, 1, 0)), mode=Mode.PRIVATE) as boss_extrude2_sk1:
        Circle(SKETCH13_R)
        Circle(SKETCH13_R_2, mode=Mode.SUBTRACT)
    boss_extrude2_tool1 = extrude(boss_extrude2_sk1.sketch, amount=-BOSS_EXTRUDE2_REACH, mode=Mode.PRIVATE) - boss_extrude2_end
    add(boss_extrude2_tool1.solids().sort_by_distance((-8.745442, 83.66, 0))[0])

    # Draft2
    draft2_faces = [part.faces().sort_by_distance(p)[0] for p in [
        (-9, 78.384054495, 0),
    ]]
    draft(draft2_faces, Plane.ZX.offset(83.66), DRAFT2_ANGLE)


solid = part.part
